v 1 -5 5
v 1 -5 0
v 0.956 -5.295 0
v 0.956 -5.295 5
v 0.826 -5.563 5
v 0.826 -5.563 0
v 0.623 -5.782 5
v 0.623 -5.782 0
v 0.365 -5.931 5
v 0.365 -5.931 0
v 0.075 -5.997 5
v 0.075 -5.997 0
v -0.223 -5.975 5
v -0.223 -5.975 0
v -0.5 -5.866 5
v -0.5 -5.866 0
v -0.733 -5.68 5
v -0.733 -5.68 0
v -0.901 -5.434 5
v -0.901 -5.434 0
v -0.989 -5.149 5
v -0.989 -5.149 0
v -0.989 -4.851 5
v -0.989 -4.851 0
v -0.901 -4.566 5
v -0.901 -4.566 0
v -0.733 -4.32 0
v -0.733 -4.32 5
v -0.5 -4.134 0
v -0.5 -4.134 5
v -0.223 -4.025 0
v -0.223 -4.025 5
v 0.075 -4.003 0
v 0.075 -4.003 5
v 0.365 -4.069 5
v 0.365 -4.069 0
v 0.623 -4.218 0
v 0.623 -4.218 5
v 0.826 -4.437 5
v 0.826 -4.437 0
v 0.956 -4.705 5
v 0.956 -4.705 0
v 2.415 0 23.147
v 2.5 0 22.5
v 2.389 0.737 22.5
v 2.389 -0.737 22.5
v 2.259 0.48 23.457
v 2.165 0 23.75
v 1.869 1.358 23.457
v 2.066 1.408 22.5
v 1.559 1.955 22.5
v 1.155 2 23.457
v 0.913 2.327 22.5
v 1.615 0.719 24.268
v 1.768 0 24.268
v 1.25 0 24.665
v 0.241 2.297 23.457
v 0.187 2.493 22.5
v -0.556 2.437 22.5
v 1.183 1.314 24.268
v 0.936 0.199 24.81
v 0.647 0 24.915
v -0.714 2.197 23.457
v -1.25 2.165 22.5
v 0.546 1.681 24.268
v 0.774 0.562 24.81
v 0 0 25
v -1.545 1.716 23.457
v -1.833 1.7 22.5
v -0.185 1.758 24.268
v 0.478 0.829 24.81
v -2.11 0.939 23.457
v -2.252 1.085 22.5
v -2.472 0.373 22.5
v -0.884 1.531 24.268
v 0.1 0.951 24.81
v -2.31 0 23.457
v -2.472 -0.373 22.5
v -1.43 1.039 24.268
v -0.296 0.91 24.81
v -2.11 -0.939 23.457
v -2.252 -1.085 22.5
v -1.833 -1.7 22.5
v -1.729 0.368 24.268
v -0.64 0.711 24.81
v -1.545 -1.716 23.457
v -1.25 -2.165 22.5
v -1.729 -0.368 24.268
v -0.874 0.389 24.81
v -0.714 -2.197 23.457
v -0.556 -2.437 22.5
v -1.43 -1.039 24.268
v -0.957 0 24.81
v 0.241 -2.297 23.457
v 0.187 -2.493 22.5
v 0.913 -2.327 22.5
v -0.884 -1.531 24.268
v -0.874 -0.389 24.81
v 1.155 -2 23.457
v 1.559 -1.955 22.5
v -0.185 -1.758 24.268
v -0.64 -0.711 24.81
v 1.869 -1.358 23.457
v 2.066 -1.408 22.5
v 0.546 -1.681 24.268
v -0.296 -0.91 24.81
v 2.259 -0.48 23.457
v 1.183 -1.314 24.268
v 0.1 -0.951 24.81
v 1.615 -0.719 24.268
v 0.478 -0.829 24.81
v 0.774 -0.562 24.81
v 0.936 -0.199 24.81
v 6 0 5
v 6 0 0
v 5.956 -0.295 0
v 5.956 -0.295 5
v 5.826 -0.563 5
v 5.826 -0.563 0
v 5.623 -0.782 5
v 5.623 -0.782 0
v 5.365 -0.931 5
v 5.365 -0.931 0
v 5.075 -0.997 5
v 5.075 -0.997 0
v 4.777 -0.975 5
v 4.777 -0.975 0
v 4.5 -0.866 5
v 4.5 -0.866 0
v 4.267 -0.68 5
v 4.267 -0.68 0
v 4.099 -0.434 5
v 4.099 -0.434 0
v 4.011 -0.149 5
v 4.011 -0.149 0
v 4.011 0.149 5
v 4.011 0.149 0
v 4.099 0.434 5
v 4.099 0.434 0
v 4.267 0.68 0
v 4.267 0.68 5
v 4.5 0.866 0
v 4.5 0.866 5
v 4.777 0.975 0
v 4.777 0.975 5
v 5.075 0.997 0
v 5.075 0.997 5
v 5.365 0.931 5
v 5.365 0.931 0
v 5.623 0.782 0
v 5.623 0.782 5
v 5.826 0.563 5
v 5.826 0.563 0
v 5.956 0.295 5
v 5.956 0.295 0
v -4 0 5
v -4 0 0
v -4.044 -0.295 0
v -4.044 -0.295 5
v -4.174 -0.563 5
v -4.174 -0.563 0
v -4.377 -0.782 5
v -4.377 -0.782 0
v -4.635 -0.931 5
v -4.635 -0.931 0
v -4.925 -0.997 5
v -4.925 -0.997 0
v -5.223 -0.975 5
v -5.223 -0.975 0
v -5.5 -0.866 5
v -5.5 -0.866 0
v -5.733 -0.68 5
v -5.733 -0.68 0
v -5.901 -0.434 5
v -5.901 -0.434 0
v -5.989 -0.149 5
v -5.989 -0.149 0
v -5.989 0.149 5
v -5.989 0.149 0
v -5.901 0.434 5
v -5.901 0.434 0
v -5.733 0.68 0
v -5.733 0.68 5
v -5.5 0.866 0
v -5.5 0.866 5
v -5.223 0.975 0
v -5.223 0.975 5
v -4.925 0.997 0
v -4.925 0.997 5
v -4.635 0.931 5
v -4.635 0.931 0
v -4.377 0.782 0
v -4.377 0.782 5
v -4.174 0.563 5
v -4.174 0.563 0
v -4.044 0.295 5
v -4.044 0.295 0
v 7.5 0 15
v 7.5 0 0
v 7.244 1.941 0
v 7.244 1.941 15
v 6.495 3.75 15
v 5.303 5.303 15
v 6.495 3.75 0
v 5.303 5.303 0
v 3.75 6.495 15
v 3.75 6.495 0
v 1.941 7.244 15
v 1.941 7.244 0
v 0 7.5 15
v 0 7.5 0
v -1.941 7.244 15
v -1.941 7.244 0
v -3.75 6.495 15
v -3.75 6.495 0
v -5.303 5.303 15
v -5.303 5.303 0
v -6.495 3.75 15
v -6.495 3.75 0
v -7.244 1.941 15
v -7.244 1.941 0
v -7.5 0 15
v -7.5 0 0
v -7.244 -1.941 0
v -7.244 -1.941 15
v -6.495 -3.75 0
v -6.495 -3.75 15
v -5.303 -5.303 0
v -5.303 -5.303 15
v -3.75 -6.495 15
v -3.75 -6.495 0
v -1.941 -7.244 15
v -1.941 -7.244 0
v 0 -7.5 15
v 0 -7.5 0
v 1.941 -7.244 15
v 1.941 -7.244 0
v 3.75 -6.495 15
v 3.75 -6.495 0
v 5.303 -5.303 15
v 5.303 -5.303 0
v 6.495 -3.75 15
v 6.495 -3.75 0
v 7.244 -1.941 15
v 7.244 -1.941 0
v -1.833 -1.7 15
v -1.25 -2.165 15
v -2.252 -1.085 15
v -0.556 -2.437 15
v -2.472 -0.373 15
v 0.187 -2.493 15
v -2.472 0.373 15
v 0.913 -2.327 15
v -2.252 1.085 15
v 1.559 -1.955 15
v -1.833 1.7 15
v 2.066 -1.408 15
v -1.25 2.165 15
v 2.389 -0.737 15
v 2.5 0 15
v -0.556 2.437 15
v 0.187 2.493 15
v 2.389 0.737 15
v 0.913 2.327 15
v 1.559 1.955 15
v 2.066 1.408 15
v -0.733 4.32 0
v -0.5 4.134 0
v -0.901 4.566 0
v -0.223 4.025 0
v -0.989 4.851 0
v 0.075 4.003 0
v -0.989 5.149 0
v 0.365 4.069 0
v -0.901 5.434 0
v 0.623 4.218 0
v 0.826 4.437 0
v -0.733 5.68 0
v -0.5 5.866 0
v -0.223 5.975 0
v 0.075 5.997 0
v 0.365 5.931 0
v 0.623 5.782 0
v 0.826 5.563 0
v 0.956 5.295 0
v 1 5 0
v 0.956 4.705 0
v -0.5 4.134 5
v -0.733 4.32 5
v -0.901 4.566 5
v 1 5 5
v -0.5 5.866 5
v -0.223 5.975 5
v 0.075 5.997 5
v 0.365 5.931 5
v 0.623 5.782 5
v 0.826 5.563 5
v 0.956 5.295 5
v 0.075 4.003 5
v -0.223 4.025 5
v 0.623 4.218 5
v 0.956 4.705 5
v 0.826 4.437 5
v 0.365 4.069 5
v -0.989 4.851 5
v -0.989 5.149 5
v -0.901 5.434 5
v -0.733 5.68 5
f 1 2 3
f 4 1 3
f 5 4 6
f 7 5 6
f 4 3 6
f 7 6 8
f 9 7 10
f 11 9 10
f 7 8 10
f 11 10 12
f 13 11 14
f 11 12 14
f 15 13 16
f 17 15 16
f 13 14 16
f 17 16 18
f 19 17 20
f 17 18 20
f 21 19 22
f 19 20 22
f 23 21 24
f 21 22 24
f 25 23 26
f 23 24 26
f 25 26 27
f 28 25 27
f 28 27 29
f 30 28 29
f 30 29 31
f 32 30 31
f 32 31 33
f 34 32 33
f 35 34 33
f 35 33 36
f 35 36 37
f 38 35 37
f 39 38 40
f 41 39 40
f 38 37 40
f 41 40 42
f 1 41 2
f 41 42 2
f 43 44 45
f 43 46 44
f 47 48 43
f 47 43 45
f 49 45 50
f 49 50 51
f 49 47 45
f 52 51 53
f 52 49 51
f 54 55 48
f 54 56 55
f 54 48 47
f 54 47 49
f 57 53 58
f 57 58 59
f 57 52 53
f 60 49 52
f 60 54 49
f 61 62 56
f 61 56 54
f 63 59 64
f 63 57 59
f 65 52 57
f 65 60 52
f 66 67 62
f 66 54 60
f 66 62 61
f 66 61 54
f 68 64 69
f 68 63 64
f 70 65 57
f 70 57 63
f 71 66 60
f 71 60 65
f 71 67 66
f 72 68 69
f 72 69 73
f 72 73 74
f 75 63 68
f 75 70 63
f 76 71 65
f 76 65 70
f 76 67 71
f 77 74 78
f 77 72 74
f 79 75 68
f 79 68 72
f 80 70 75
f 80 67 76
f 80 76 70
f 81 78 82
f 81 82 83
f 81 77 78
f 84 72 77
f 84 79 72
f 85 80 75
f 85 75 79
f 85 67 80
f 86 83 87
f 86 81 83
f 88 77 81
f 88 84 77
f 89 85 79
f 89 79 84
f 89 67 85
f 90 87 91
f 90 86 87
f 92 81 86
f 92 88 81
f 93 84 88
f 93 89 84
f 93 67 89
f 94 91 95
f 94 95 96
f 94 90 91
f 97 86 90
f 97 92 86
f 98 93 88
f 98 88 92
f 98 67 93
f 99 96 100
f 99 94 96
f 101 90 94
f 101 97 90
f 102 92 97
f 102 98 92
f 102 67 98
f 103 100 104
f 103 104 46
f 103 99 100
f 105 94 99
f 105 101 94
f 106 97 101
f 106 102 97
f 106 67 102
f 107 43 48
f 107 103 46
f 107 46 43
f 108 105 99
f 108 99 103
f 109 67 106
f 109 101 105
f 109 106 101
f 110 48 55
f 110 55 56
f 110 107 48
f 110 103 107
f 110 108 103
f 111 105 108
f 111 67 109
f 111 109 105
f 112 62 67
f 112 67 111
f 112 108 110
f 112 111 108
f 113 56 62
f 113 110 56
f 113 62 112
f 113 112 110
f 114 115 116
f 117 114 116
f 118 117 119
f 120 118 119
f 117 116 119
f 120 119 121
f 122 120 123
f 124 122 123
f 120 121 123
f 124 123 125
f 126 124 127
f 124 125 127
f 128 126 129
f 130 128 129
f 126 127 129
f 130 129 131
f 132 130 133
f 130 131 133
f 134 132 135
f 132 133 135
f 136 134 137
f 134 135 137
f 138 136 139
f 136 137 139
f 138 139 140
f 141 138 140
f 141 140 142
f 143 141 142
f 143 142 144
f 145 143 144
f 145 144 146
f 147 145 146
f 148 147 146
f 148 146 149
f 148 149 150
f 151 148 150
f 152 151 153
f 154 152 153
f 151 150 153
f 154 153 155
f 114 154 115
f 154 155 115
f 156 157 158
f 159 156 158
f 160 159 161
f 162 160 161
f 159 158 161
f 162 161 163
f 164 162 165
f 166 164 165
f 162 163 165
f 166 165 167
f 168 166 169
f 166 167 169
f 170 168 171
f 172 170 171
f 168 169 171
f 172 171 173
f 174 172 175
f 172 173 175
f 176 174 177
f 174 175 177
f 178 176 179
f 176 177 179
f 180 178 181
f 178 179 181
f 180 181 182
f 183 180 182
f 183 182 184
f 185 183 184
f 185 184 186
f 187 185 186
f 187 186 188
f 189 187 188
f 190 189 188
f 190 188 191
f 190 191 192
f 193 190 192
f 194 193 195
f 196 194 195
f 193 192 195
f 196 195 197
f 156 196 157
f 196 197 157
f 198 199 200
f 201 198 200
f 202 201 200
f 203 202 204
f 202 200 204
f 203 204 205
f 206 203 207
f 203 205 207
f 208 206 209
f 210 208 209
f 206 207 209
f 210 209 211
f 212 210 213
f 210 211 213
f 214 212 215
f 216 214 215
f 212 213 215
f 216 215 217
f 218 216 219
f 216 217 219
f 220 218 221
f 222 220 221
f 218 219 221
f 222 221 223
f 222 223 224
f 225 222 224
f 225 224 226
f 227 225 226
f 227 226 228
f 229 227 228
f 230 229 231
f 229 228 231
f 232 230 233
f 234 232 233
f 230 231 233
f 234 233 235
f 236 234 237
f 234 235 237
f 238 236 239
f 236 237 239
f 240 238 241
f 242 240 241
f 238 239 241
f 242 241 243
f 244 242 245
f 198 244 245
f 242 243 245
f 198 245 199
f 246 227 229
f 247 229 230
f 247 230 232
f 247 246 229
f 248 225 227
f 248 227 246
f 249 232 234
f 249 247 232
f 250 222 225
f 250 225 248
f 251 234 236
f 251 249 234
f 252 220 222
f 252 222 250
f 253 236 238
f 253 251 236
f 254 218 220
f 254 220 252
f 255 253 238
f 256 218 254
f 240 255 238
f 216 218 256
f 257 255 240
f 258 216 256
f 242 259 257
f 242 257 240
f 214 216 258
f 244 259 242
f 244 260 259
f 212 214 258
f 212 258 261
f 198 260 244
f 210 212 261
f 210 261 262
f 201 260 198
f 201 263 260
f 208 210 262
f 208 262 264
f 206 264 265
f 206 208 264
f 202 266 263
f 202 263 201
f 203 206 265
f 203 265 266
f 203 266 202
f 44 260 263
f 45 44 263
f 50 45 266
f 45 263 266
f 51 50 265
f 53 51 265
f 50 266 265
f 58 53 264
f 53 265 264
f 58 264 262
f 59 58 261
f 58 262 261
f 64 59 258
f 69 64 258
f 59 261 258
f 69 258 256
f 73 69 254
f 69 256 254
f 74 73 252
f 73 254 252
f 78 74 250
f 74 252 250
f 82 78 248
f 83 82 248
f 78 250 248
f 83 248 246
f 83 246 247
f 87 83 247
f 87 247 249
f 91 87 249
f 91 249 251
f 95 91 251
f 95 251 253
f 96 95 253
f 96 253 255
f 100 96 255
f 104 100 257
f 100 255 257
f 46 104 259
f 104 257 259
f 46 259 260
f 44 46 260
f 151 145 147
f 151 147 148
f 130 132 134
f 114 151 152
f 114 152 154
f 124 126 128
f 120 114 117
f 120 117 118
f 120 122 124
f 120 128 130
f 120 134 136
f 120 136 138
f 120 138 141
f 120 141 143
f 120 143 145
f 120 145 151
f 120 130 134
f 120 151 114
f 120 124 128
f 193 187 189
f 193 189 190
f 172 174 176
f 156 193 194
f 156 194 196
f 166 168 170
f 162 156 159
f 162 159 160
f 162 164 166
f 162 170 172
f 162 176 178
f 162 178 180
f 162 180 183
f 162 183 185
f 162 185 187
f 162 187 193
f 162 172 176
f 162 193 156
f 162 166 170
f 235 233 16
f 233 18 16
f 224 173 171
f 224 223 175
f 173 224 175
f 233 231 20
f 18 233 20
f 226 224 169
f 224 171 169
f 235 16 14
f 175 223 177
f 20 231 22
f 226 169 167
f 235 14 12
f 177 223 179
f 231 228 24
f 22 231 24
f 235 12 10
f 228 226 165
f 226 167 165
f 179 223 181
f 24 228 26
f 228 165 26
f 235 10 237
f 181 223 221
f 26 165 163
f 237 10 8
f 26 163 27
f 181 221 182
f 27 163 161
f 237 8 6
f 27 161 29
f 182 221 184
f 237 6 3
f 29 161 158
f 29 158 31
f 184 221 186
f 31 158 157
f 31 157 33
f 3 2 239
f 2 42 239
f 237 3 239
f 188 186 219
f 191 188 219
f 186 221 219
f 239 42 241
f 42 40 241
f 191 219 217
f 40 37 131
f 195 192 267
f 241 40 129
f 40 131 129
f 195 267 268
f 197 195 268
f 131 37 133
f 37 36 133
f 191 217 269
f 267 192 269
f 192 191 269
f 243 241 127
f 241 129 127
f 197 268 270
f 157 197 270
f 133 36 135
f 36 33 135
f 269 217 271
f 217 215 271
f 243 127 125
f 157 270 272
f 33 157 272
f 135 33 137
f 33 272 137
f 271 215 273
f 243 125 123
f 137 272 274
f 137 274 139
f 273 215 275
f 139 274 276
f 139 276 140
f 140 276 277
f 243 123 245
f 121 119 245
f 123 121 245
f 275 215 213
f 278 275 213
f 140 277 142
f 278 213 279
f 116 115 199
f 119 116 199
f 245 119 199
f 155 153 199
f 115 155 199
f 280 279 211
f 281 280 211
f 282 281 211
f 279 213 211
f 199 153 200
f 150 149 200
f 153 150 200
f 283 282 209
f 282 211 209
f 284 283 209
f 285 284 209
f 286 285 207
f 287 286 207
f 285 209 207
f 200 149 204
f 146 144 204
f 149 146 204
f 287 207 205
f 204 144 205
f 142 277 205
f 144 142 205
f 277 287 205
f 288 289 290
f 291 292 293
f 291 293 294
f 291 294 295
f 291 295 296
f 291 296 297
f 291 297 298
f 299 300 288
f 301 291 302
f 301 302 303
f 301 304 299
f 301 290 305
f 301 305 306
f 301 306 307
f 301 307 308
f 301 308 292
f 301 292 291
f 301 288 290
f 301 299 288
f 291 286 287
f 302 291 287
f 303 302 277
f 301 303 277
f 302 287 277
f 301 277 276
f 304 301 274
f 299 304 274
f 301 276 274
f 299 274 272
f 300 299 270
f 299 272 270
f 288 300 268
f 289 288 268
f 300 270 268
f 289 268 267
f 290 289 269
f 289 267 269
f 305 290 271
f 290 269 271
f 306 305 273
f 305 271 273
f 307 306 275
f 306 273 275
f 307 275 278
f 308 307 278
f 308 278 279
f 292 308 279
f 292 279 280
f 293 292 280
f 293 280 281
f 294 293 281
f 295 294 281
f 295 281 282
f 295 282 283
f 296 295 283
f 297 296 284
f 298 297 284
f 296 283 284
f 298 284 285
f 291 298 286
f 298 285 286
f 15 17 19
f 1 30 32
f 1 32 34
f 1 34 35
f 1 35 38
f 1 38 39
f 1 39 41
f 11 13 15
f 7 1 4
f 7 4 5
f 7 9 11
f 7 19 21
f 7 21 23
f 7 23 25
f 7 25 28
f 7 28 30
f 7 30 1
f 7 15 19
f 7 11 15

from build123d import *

# Parameters (mm, degrees)
F0_R     = 7.5
F1_DEPTH = 15
F2_R     = 1
F3_DEPTH = 5
F4_R     = 2.5
F5_DEPTH = 10
F6_R     = 2.5


with BuildPart() as f1:
    # F0 (on Top) → F1 (new body)
    with BuildSketch(Plane.XY):
        Circle(F0_R)
    extrude(amount=F1_DEPTH)

    # F2 (on face) → F3 (cut)
    with BuildSketch(Plane(origin=(0, 0, 0), x_dir=(1, 0, 0), z_dir=(0, 0, -1))):
        with Locations((0, 5)):
            Circle(F2_R)
        with Locations((-5, 0)):
            Circle(F2_R)
        with Locations((0, -5)):
            Circle(F2_R)
        with Locations((5, 0)):
            Circle(F2_R)
    extrude(amount=-F3_DEPTH, mode=Mode.SUBTRACT)

    # F4 (on face) → F5 (join)
    with BuildSketch(Plane.XY.offset(15)):
        Circle(F4_R)
    extrude(amount=F5_DEPTH)

    # F6
    f6_edges = [f1.edges().sort_by_distance(p)[0] for p in [
        (-2.5, 0, 25),
    ]]
    fillet(f6_edges, radius=F6_R)


solid = f1.part
